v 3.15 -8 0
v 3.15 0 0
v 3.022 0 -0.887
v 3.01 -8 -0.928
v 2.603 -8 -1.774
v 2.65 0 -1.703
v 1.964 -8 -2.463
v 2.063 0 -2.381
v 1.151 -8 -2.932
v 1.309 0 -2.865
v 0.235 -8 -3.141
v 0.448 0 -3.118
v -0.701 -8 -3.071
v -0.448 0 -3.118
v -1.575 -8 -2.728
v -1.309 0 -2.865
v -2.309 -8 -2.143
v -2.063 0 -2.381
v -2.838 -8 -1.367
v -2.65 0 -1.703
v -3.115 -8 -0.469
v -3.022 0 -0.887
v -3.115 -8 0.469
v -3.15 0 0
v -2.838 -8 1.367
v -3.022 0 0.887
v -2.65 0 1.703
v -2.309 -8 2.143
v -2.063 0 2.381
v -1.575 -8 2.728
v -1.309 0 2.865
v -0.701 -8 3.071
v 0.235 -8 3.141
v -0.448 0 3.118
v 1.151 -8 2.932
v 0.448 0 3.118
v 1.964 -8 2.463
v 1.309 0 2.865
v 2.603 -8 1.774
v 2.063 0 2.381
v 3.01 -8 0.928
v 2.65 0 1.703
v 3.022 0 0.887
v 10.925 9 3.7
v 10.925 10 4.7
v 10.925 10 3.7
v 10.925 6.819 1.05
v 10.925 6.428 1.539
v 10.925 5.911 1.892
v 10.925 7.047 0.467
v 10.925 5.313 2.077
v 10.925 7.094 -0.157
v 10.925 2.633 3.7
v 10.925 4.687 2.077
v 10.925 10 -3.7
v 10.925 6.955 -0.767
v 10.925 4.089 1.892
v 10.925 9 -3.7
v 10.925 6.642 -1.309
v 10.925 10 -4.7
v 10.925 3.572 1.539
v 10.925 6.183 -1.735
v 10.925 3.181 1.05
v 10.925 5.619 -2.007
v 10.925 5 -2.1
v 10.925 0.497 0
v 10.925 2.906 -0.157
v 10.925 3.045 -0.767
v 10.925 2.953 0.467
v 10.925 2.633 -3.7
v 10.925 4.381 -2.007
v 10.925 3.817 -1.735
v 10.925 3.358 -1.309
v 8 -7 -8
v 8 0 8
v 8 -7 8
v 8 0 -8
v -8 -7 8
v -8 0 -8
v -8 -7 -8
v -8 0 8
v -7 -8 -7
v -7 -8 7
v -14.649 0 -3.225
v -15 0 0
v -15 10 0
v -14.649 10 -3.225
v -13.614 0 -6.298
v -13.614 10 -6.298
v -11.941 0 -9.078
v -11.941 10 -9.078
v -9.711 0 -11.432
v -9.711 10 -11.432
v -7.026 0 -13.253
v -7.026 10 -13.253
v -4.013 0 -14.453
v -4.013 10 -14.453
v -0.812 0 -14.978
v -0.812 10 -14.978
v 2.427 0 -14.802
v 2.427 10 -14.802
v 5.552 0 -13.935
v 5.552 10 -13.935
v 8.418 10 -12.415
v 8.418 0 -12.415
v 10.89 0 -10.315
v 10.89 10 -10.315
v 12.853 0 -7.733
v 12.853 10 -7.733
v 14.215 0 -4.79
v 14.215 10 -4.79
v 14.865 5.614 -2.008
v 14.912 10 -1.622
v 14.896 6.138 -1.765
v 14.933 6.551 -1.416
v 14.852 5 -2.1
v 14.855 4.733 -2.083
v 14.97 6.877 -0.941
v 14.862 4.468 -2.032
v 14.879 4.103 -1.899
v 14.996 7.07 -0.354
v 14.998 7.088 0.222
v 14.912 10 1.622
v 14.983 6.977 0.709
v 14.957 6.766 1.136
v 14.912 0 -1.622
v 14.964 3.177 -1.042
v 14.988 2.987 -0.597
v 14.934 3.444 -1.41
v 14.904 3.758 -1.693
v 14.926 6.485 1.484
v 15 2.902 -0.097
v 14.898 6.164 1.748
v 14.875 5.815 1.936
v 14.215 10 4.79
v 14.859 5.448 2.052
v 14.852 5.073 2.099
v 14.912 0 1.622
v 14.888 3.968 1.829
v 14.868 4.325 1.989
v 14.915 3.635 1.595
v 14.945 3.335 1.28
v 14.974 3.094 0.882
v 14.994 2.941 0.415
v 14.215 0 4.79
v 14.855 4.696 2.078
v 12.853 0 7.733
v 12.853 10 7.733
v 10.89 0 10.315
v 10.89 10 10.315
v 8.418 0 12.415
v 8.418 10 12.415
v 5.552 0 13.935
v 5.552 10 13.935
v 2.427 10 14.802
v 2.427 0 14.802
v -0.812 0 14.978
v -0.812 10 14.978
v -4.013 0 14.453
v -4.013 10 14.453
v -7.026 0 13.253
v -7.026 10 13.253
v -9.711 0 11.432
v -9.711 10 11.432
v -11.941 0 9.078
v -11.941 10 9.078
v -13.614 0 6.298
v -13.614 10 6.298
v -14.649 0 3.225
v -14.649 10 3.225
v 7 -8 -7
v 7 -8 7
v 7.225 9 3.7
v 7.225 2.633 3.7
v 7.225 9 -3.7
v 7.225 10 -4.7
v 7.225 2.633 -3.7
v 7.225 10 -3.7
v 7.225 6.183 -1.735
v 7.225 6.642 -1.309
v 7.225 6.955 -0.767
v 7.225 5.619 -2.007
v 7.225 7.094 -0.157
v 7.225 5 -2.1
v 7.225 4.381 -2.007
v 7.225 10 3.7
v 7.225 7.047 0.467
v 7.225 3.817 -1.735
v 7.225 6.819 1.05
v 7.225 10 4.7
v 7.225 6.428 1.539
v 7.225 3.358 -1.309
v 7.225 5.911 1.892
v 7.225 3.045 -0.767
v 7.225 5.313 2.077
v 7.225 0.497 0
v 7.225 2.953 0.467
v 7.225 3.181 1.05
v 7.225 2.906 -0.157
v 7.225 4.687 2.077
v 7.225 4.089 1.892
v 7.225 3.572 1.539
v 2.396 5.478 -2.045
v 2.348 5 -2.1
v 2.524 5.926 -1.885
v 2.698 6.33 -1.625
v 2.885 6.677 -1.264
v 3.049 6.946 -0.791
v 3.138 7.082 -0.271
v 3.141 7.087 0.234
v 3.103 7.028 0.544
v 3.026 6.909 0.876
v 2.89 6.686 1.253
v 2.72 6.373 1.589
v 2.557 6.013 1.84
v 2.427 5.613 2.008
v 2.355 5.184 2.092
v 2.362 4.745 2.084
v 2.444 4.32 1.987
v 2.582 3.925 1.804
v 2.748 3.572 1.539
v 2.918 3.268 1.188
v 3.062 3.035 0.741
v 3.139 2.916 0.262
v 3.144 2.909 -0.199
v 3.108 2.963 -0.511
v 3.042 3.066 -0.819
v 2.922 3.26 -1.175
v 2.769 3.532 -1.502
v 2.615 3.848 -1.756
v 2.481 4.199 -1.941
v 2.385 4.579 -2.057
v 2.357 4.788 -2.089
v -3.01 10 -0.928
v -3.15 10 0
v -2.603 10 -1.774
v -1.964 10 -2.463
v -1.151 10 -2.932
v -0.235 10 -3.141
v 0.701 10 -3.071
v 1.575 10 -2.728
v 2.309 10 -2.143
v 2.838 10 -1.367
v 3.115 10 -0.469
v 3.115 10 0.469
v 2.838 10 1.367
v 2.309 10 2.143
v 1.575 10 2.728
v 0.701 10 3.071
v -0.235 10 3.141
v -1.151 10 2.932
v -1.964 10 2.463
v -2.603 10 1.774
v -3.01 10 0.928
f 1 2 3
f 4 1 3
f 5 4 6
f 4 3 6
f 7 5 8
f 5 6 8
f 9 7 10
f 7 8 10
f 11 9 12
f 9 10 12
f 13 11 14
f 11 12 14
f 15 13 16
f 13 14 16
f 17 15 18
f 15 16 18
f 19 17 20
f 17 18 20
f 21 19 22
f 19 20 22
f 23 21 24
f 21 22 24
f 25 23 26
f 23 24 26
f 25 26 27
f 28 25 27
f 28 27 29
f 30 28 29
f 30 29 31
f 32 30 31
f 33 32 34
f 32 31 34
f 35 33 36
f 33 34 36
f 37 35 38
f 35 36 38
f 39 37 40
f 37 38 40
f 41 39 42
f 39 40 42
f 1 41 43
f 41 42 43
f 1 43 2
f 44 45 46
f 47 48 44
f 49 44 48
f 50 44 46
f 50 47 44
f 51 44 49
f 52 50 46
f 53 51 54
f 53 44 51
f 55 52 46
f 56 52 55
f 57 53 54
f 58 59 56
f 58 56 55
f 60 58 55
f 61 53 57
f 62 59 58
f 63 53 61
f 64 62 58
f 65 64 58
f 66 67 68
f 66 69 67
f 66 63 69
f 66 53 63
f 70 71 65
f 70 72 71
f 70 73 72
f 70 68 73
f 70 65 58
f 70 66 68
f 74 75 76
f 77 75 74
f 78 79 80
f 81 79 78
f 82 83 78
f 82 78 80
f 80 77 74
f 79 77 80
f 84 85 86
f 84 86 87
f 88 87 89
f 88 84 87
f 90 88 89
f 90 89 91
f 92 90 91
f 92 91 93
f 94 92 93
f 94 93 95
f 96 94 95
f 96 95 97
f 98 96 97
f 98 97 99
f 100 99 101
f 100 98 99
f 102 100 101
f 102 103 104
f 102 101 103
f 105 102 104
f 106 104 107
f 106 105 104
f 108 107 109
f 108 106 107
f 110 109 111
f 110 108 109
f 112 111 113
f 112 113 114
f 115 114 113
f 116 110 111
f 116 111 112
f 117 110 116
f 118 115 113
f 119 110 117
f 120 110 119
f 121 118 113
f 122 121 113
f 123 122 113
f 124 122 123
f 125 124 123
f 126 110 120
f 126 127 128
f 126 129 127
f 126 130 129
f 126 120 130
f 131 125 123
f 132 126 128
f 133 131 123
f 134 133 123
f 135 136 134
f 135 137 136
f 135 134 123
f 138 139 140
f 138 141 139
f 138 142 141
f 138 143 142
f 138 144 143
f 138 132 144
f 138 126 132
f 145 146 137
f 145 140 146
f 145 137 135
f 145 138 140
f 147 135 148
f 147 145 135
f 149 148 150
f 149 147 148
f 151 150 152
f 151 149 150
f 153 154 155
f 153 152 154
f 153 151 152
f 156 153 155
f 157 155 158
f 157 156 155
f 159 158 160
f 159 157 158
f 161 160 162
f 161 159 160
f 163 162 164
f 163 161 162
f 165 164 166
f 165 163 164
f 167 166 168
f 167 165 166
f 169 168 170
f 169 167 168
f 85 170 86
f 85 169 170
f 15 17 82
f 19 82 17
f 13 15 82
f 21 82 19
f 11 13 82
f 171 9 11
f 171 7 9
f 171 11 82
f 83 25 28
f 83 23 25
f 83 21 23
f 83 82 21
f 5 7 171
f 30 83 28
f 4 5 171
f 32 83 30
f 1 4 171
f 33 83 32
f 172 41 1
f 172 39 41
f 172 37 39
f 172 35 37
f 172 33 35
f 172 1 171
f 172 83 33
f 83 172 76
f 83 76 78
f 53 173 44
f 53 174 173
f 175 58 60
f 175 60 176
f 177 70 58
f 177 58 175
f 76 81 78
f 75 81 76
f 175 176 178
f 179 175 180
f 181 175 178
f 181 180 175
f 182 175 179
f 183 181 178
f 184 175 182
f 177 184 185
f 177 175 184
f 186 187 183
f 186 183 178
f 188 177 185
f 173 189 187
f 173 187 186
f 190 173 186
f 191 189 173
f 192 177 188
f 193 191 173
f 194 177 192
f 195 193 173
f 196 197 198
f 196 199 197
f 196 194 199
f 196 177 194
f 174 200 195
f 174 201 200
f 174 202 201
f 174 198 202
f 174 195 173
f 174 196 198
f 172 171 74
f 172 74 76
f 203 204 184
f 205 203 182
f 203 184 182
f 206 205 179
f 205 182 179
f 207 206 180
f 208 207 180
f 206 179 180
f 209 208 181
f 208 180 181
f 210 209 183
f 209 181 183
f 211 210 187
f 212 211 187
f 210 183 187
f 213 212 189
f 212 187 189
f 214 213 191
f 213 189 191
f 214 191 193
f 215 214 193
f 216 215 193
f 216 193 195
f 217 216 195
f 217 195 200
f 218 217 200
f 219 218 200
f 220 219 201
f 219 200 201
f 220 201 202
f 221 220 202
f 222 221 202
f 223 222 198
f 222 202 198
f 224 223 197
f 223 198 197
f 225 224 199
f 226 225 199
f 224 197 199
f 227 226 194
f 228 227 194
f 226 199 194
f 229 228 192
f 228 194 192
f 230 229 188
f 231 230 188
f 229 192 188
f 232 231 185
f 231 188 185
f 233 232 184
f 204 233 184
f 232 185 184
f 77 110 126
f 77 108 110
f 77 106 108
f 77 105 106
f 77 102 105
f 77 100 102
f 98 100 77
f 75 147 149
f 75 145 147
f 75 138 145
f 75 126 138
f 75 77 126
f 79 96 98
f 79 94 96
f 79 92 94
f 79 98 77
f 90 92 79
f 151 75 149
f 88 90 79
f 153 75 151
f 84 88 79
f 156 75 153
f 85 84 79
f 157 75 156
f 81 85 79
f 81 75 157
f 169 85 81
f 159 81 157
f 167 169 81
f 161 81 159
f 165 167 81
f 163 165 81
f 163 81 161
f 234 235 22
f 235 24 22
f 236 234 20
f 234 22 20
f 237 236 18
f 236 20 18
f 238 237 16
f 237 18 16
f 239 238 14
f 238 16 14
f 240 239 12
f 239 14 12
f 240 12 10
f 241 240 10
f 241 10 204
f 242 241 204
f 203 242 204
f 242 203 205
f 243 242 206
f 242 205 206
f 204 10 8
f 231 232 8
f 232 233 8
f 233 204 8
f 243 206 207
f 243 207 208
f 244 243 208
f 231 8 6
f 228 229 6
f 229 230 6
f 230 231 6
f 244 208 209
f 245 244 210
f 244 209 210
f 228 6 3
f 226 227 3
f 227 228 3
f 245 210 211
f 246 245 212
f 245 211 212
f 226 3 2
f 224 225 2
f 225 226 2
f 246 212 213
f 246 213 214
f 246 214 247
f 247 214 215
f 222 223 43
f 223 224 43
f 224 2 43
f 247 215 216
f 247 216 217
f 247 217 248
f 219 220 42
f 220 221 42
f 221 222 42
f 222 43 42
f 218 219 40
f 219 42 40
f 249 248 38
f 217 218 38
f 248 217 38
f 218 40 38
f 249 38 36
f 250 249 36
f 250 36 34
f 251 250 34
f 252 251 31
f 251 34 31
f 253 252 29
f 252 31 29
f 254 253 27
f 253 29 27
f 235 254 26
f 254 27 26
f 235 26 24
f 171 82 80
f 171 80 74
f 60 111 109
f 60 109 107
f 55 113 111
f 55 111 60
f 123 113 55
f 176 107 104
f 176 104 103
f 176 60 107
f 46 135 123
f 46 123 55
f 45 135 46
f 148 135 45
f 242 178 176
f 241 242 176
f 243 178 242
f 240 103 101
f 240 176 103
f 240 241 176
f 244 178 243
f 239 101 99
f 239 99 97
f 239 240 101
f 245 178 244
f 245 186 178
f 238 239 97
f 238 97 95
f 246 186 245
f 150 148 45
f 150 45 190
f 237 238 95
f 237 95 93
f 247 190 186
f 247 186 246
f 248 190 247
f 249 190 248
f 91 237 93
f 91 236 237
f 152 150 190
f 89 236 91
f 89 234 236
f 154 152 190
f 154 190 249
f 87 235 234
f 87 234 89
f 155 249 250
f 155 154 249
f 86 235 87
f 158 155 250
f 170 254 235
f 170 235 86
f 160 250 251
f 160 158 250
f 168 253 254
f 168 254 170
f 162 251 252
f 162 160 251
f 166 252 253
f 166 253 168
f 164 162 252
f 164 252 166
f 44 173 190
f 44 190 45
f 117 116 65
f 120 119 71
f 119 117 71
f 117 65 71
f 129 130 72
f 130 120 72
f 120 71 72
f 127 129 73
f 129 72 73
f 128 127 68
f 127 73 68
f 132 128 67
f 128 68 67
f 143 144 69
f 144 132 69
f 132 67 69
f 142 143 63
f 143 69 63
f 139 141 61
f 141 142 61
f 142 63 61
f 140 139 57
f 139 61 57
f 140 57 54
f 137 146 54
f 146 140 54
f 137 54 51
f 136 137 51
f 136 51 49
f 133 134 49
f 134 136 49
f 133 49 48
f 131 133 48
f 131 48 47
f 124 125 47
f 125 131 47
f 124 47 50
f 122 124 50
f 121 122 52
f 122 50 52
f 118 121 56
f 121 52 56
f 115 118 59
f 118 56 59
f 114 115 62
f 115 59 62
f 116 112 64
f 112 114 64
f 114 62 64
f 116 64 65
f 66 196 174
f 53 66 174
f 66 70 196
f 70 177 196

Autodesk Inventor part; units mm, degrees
ref_plane "YZ Plane" through (0, 0, 0) normal (1, 0, 0) x (0, 1, 0)
ref_plane "XZ Plane" through (0, 0, 0) normal (0, 1, 0) x (-1, 0, 0)
ref_plane "XY Plane" through (0, 0, 0) normal (0, 0, 1) x (1, 0, 0)
sketch "Boceto1" plane through (0, 0, 0) normal (0, 1, 0) x (-1, 0, 0)
  circle A0 centre (0, 0) radius 3.15
  circle A1 centre (0, 0) radius 15
  line L0 (-7.225, 3.7) -> (-10.925, 3.7)
  line L1 (-10.925, 3.7) -> (-10.925, -3.7)
  line L2 (-10.925, -3.7) -> (-7.225, -3.7)
  line L3 (-7.225, -3.7) -> (-7.225, 3.7)
  circle A2 centre (0, 0) radius 9.8003 construction
  line L4 (6.8168, -4.407) -> (0.4082, -8.107)
  line L5 (8.6668, -7.6113) -> (6.8168, -4.407)
  line L6 (2.2582, -11.3113) -> (8.6668, -7.6113)
  line L7 (0.4082, -8.107) -> (2.2582, -11.3113)
  line L8 (0.4082, 8.107) -> (6.8168, 4.407)
  line L9 (2.2582, 11.3113) -> (0.4082, 8.107)
  line L10 (8.6668, 7.6113) -> (2.2582, 11.3113)
  line L11 (6.8168, 4.407) -> (8.6668, 7.6113)
  point P0 (-7.225, 0)
  point P1 (-9.075, 3.7)
  point P2 (3.6125, -6.257)
  point P3 (1.3332, -9.7092)
  point P4 (3.6125, 6.257)
  point P5 (7.7418, 6.0092)
  dimension "d0" = 6.3
  dimension "tuerca" = 7.4
  dimension "d2" = 11.85
  dimension "d3" = 6.6503
  dimension "d4" = 3.7
  dimension "d18" = 360
  dimension "d26" = 30
  dimension "d27" = 4.075
  dimension "d28" = 4.075
extrude "Extrusión1" add sketch "Boceto1" along normal blind 10 contours A1 | L5 L6 L7 L4 | L9 L10 L11 L8
sketch "Boceto2" plane through (7.225, 0, -3.7) normal (1, 0, 0) x (0, 0, -1)
  line L0 (0, 0) -> (-7.4, 0) projected
  line L1 (0, 0) -> (0, 10) construction
  line L2 (-7.4, 10) -> (0, 10) construction
  line L3 (-7.4, 0) -> (-7.4, 10) construction
  line L4 (-7.4, 0) -> (0, 10) construction
  circle A0 centre (-3.7, 5) radius 2.1
  line L5 (0, 2.6329) -> (-4.5603, 0)
  line L6 (-2.8397, 0) -> (-7.4, 2.6329)
  line L7 (-7.4, 2.6329) -> (-7.4, 0)
  line L8 (0, 2.6329) -> (0, 0)
  point P0 (-3.7, 0)
  dimension "d7" = 4.2
  dimension "d8" = 120
  dimension "d9" = 3.9
extrude "Extrusión2" cut sketch "Boceto2" along normal mid plane 16 contours A0
extrude "Extrusión3" add sketch "Boceto2" along normal up to next contours L0 L6 L5 L8 | L0 L5 L6 | L0 L7 L6 L5
sketch "Boceto3" plane through (0, 0, 0) normal (0, -1, 0) x (1, 0, 0)
  circle A0 centre (0, 0) radius 3.15 projected
  circle A1 centre (0, 0) radius 27.5
  line L0 (-8, 8) -> (8, 8)
  line L1 (8, 8) -> (8, -8)
  line L2 (8, -8) -> (-8, -8)
  line L3 (-8, -8) -> (-8, 8)
  point P0 (-8, 0)
  point P1 (0, 8)
  dimension "d32" = 16
  dimension "d33" = 55
extrude "Extrusión4" add sketch "Boceto3" along normal blind 8 contours L0 L1 L2 L3
chamfer "Chaflán1" distance 1 angle 45 2 edges at (9.075, 10, 3.7) (9.075, 10, -3.7)
chamfer "Chaflán3" distance 1 angle 45 4 edges at (0, -8, 8) (-8, -8, 0) (0, -8, -8) (8, -8, 0)
equation "\"d28\" = d27"
properties part number "dado polea"
